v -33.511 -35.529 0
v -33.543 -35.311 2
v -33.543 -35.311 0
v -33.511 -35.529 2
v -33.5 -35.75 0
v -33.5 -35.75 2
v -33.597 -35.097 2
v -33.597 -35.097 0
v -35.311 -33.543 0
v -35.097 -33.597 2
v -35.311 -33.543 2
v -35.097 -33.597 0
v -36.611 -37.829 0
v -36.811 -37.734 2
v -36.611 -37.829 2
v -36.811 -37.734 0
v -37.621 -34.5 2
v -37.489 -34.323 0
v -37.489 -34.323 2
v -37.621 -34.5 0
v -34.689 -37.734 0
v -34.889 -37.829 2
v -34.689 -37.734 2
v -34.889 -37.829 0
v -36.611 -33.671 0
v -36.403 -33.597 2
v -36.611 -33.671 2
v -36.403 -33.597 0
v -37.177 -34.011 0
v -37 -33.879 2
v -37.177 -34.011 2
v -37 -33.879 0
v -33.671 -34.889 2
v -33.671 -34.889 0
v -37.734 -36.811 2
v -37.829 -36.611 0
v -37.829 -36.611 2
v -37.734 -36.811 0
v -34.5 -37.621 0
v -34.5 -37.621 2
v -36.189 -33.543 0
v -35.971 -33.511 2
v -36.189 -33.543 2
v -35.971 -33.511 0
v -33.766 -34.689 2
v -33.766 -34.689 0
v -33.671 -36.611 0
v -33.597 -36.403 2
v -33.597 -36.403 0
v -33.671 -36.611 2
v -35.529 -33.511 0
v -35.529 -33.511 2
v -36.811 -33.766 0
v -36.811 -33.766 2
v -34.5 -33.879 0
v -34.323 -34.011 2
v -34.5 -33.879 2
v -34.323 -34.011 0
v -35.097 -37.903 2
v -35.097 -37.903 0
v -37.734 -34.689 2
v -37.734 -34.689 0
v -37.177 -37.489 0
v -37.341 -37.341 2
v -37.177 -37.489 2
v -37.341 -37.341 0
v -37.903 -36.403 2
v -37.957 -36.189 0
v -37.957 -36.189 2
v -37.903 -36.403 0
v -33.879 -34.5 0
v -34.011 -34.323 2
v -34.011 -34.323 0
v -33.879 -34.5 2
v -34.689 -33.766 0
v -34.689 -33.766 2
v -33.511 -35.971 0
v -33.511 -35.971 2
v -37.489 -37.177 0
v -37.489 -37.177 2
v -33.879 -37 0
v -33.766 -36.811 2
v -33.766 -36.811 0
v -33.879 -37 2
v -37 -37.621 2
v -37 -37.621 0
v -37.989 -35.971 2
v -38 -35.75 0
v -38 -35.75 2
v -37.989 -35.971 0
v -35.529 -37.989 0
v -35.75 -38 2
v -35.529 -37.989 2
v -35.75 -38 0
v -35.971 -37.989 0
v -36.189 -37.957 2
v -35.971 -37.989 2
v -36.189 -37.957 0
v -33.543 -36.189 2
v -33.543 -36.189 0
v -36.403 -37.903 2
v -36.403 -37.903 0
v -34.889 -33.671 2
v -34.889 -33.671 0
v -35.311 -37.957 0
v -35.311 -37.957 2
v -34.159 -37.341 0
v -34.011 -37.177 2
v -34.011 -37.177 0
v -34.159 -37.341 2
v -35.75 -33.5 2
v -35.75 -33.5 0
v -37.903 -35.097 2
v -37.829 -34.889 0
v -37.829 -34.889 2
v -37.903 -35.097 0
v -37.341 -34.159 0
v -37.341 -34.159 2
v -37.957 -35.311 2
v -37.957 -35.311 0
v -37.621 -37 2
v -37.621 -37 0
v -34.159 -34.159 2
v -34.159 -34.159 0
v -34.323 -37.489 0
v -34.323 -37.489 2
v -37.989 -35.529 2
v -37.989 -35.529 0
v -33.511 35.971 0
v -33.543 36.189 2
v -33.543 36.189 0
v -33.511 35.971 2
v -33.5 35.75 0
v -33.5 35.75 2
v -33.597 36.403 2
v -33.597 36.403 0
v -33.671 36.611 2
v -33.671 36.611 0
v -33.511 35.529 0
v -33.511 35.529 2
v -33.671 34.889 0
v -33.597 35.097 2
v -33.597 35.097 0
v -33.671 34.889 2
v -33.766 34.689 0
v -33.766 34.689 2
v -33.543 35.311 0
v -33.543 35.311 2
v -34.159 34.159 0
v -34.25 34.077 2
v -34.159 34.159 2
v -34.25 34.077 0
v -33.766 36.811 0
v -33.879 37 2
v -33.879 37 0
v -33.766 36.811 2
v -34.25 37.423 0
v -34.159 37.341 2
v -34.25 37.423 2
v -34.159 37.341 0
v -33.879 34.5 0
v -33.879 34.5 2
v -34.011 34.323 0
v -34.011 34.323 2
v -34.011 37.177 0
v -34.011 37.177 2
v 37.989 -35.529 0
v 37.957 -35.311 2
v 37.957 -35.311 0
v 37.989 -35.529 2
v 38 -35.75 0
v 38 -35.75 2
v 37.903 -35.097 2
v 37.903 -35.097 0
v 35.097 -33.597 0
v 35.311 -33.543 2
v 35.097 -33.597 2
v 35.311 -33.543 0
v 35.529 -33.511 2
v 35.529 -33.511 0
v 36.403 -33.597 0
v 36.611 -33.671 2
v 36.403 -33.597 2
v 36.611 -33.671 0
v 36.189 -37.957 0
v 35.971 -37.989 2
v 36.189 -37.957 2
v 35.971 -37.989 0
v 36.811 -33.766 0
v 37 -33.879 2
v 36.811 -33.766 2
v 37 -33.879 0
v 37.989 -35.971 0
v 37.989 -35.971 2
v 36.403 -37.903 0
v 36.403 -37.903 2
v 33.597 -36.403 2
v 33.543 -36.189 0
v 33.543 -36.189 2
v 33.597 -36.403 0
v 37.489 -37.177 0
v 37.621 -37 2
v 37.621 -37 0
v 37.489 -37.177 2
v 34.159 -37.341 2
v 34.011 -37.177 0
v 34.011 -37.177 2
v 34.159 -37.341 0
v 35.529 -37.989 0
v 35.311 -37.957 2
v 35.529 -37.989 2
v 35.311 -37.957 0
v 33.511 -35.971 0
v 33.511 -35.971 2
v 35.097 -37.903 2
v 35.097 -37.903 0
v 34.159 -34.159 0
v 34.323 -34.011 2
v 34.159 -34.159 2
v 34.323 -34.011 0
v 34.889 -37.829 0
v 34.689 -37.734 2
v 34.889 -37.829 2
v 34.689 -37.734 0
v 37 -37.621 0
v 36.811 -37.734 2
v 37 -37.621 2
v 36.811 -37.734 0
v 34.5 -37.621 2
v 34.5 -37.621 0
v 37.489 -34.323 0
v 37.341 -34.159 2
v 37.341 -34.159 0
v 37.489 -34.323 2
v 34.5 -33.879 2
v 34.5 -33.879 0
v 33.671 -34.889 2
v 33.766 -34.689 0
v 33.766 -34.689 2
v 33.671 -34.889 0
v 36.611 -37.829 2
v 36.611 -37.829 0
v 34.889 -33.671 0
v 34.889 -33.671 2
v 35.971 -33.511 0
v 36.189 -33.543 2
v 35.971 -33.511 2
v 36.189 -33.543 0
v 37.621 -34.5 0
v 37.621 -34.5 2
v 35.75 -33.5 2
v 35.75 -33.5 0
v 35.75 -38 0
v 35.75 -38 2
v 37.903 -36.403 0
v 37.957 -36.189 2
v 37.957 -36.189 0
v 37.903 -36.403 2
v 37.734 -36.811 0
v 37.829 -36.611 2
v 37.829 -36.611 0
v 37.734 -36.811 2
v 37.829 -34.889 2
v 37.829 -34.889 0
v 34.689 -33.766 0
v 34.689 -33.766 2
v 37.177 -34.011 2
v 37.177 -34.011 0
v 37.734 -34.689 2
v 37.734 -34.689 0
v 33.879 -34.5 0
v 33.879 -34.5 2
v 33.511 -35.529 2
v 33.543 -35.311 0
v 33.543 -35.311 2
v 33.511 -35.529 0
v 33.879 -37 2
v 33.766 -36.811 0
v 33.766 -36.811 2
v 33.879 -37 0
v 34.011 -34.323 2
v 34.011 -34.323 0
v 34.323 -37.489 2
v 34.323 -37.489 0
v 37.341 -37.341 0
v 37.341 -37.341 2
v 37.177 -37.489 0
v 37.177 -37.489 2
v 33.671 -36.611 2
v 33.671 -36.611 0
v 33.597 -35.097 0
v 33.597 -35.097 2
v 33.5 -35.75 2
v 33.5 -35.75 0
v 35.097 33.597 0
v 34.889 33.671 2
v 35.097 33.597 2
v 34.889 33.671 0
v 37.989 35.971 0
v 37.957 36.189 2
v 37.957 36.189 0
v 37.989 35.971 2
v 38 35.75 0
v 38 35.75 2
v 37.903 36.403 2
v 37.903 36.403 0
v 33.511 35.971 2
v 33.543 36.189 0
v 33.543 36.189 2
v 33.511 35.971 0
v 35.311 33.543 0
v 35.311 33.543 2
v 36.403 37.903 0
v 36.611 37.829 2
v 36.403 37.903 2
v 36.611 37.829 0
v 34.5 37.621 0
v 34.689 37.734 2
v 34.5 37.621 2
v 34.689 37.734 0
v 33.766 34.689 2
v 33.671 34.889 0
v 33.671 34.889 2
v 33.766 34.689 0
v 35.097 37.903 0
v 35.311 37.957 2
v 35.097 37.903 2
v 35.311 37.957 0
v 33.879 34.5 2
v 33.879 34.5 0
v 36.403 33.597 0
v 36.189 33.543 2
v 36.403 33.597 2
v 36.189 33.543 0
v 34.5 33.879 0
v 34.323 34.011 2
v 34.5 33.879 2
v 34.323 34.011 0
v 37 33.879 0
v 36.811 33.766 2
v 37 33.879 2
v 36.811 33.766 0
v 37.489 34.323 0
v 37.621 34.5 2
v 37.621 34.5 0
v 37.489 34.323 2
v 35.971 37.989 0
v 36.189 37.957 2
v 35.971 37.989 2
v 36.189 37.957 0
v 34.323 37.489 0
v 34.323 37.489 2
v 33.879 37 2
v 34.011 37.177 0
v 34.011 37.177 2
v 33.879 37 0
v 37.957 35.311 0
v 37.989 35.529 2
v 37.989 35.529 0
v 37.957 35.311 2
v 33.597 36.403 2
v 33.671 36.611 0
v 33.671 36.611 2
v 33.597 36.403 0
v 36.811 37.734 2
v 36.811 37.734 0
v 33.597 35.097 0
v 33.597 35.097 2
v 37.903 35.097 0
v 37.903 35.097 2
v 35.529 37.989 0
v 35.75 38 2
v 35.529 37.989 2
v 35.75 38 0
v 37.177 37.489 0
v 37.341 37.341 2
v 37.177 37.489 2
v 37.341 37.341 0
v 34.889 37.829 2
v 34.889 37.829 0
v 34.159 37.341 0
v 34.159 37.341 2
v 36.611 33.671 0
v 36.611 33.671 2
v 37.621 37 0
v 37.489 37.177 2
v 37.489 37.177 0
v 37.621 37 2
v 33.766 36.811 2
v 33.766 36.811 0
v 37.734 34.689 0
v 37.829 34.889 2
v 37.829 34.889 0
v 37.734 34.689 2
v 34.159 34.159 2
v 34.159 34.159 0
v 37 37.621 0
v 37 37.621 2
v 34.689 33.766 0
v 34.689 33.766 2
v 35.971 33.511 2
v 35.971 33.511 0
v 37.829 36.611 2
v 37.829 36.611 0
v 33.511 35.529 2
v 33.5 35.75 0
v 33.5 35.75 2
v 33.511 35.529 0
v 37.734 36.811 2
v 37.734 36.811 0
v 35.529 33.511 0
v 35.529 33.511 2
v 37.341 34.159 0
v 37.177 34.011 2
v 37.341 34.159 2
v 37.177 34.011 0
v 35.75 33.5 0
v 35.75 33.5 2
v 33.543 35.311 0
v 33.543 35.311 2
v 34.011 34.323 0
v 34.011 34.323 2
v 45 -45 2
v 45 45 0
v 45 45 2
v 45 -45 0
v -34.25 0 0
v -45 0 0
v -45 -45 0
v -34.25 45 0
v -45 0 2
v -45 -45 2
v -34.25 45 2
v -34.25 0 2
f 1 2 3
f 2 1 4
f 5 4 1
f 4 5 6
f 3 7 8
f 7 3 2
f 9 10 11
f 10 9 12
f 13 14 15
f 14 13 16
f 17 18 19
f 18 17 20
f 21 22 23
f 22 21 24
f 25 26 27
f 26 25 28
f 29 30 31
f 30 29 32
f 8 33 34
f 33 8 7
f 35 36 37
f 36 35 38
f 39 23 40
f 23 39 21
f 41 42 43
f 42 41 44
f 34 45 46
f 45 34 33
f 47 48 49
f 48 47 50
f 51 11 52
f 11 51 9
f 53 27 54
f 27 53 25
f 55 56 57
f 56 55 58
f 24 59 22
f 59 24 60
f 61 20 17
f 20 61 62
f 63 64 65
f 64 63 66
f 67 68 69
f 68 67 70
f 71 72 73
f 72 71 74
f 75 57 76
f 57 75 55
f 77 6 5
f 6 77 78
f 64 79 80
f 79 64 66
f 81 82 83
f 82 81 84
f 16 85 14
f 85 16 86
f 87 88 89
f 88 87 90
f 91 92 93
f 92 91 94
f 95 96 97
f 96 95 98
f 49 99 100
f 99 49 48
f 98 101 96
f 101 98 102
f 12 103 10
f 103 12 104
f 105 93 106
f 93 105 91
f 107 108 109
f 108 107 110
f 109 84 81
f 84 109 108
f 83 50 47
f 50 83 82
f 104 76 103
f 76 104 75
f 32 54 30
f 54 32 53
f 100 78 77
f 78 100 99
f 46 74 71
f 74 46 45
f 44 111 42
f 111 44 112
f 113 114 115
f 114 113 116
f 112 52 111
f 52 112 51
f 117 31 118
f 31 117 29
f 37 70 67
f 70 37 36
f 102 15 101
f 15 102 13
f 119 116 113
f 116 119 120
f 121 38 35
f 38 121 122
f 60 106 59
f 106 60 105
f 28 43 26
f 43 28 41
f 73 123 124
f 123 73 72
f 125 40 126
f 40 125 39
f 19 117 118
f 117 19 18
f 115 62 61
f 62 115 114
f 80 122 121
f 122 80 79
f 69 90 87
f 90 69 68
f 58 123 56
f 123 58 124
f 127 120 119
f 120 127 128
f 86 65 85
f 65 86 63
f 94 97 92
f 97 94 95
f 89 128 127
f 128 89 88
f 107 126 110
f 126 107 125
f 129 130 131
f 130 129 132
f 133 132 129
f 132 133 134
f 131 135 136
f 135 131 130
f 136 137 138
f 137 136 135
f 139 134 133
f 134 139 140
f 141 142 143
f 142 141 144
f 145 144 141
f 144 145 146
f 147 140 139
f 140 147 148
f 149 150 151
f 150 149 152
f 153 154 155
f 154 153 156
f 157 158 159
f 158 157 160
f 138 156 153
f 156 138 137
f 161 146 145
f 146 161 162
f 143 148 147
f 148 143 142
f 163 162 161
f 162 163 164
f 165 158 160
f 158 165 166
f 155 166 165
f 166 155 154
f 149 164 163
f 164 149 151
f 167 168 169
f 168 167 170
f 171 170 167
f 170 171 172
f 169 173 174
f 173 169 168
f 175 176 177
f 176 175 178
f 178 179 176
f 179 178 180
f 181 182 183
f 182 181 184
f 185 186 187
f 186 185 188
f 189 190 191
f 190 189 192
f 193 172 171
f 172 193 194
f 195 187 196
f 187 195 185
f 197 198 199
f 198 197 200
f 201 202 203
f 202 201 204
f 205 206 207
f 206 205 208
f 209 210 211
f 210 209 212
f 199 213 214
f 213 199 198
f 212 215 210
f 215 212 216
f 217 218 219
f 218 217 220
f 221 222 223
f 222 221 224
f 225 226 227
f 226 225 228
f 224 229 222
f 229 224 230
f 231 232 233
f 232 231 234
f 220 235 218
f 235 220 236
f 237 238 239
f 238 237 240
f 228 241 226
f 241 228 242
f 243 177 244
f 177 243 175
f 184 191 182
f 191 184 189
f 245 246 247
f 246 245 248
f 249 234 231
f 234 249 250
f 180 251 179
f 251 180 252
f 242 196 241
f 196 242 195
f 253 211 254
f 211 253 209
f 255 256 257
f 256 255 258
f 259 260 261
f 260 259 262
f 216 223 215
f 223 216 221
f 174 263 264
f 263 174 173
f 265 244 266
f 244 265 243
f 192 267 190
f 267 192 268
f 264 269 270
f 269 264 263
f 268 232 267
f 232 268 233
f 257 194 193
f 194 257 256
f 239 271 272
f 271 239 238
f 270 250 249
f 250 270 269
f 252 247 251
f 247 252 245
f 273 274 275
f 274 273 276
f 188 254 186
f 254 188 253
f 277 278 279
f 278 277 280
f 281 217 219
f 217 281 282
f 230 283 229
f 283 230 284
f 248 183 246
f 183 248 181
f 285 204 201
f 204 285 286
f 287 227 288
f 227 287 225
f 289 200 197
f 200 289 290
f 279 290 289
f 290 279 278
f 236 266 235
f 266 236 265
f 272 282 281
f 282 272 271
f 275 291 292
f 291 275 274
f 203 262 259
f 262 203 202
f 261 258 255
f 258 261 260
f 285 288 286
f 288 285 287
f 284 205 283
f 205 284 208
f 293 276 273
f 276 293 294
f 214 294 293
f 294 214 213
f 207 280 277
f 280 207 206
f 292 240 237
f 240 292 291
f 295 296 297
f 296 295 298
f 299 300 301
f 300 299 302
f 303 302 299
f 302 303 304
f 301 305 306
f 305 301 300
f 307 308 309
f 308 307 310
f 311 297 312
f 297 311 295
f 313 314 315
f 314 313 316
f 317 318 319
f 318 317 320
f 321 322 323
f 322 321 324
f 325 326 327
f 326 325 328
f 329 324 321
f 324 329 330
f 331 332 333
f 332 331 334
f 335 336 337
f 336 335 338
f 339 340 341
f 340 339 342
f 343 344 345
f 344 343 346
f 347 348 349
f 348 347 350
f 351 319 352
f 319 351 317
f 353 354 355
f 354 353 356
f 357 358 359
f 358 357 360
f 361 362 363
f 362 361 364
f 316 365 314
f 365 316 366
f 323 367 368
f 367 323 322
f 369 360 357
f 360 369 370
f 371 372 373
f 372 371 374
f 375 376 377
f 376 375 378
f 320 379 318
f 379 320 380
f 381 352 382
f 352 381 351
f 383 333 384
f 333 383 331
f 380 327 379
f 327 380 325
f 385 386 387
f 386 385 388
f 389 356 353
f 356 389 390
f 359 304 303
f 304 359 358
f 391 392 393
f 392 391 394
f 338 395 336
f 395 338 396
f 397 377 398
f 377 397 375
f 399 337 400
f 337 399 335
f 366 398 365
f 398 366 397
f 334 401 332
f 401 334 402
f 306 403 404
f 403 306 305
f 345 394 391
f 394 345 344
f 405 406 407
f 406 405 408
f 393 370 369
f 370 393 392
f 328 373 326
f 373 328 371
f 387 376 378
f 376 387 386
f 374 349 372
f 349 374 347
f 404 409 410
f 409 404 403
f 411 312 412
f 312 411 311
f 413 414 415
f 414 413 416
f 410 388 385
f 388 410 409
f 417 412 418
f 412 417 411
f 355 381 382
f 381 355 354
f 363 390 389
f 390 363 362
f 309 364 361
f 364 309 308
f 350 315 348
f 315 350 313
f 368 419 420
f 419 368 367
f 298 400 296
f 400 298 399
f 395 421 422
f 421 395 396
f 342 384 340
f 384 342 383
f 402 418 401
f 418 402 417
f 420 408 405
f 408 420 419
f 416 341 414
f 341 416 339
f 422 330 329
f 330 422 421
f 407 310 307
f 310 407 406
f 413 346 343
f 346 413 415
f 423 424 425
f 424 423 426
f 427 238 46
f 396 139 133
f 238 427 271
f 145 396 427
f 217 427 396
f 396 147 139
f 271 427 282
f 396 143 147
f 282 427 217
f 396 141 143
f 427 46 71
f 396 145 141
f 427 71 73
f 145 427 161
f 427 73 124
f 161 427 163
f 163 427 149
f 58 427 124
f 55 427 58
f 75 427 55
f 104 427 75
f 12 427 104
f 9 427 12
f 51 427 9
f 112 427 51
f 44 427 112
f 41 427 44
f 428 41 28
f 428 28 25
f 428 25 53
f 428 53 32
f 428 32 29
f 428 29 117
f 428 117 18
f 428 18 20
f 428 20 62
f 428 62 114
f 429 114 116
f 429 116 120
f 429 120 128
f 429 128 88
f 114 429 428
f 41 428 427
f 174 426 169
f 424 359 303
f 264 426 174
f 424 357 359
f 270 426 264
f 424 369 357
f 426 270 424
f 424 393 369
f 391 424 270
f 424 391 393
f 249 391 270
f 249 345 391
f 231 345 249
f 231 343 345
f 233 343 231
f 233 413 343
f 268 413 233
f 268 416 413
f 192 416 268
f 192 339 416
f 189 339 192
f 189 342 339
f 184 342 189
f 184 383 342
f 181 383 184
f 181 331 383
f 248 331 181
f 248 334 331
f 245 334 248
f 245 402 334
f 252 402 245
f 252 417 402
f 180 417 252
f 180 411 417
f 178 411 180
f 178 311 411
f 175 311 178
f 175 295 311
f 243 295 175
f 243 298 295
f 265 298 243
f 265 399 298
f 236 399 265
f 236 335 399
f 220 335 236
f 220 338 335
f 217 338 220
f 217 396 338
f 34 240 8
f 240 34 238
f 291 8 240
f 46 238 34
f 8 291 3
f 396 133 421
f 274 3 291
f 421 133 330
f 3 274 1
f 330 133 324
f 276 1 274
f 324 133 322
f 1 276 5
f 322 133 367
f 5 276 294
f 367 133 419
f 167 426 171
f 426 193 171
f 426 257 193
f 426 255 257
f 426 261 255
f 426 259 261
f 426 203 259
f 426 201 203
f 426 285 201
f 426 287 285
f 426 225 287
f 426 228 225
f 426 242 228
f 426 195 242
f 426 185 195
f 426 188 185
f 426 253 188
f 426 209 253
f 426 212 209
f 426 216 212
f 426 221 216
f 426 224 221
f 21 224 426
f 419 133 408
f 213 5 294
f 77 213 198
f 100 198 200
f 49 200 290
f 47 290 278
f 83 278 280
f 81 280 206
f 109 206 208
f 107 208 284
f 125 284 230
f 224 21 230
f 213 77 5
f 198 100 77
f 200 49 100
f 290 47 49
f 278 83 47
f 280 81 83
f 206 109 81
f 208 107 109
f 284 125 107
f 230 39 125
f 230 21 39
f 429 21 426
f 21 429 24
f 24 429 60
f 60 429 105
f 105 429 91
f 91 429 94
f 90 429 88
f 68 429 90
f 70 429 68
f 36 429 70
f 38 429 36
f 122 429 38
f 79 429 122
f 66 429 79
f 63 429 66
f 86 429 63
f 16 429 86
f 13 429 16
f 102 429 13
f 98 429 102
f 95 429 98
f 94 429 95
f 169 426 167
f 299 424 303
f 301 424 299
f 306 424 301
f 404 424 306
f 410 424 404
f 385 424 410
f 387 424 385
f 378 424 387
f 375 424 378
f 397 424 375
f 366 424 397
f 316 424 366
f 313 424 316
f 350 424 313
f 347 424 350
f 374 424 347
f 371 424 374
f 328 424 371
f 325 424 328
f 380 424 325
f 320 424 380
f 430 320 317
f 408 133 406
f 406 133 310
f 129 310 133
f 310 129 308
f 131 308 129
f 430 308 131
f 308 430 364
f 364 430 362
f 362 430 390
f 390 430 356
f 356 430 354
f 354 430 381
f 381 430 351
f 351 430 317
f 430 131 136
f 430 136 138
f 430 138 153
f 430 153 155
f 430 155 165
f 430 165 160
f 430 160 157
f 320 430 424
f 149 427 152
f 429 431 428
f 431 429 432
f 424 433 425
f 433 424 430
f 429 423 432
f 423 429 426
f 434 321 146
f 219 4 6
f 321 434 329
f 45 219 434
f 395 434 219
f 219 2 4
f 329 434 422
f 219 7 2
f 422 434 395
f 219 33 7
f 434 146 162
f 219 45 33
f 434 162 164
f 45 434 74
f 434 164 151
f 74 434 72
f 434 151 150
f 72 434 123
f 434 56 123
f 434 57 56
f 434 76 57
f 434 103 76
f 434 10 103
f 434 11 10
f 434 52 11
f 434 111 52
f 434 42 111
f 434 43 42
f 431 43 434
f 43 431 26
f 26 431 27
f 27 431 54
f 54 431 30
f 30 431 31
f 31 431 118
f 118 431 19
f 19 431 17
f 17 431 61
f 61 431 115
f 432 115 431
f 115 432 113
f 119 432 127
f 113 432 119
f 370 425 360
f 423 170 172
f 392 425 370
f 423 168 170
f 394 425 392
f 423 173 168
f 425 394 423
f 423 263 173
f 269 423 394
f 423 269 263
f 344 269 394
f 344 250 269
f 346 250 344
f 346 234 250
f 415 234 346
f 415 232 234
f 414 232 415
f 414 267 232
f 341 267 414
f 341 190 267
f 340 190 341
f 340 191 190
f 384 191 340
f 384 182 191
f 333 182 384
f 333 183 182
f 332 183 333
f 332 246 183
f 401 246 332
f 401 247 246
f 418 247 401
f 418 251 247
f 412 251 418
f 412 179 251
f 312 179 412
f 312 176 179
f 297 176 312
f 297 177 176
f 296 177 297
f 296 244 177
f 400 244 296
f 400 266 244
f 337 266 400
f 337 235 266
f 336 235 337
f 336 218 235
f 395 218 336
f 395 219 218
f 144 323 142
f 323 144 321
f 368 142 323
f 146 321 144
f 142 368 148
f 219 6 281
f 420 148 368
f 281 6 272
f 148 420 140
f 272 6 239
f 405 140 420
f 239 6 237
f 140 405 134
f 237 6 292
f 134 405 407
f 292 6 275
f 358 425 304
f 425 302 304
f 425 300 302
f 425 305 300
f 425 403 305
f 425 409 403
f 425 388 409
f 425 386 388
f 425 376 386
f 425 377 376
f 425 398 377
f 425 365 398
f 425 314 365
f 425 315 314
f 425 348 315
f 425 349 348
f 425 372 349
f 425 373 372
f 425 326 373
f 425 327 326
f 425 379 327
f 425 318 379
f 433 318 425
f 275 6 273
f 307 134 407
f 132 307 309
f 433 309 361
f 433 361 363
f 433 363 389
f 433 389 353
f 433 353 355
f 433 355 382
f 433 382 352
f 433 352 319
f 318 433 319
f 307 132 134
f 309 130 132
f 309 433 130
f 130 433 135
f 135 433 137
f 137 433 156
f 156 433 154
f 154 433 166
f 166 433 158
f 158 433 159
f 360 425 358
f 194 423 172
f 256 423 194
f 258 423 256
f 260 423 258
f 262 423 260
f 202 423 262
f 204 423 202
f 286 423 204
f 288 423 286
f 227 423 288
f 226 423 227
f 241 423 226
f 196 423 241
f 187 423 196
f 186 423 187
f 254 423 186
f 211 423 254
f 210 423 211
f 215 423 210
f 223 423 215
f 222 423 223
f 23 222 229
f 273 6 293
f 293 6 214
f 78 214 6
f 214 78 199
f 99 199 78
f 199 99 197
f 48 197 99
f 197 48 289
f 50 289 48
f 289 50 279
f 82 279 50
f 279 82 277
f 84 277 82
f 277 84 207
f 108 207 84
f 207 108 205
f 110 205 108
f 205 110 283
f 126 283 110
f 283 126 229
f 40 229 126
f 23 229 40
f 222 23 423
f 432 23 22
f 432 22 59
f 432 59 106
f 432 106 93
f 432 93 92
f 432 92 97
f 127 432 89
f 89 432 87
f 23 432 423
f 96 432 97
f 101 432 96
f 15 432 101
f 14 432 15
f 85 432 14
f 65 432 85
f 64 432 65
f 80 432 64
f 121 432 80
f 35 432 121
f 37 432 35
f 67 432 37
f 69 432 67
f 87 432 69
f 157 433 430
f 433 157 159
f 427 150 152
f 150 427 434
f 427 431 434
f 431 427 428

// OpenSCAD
// Magnetic stirrer housing - open box covering an 80 mm PC fan
// Print orientation: top plate on bed (z = 0), walls rise to z = 40

// ---- Dimensions (mm) ----
top_t        = 2;     // top plate thickness
wall_t       = 2.5;   // wall thickness
box_h        = 40;    // total height of walls
outer        = 90;    // outer size (X x Y)
hole         = 4.5;   // M4 screw hole diameter
hole_pitch   = 71.5;  // square pattern of screw holes
notch_w      = 12;    // cable notch width
notch_bottom = 8;     // notch depth from open edge
eps          = 0.5;   // cutter overshoot

$fn = 64;

difference() {
    // Solid box
    translate([-outer/2, -outer/2, 0])
        cube([outer, outer, top_t + wall_t]);

    // Open top: hollow to z = 32, leaving the lower walls solid
    translate([-outer/2, -outer/2, top_t])
        cube([outer, outer, wall_t + 8 - eps]);

    // Screw holes through the top plate
    for (sx = [-hole_pitch/2, hole_pitch/2])
        for (sy = [-hole_pitch/2, hole_pitch/2])
            translate([sx, sy, -eps])
                cylinder(d = hole, h = top_t + 2*eps);

    // Cable notch in one wall, centred along the wall
    translate([-outer/2 - wall_t/2, 0, top_t + wall_t - notch_bottom])
        cube([notch_w, outer, notch_bottom + eps]);
}
